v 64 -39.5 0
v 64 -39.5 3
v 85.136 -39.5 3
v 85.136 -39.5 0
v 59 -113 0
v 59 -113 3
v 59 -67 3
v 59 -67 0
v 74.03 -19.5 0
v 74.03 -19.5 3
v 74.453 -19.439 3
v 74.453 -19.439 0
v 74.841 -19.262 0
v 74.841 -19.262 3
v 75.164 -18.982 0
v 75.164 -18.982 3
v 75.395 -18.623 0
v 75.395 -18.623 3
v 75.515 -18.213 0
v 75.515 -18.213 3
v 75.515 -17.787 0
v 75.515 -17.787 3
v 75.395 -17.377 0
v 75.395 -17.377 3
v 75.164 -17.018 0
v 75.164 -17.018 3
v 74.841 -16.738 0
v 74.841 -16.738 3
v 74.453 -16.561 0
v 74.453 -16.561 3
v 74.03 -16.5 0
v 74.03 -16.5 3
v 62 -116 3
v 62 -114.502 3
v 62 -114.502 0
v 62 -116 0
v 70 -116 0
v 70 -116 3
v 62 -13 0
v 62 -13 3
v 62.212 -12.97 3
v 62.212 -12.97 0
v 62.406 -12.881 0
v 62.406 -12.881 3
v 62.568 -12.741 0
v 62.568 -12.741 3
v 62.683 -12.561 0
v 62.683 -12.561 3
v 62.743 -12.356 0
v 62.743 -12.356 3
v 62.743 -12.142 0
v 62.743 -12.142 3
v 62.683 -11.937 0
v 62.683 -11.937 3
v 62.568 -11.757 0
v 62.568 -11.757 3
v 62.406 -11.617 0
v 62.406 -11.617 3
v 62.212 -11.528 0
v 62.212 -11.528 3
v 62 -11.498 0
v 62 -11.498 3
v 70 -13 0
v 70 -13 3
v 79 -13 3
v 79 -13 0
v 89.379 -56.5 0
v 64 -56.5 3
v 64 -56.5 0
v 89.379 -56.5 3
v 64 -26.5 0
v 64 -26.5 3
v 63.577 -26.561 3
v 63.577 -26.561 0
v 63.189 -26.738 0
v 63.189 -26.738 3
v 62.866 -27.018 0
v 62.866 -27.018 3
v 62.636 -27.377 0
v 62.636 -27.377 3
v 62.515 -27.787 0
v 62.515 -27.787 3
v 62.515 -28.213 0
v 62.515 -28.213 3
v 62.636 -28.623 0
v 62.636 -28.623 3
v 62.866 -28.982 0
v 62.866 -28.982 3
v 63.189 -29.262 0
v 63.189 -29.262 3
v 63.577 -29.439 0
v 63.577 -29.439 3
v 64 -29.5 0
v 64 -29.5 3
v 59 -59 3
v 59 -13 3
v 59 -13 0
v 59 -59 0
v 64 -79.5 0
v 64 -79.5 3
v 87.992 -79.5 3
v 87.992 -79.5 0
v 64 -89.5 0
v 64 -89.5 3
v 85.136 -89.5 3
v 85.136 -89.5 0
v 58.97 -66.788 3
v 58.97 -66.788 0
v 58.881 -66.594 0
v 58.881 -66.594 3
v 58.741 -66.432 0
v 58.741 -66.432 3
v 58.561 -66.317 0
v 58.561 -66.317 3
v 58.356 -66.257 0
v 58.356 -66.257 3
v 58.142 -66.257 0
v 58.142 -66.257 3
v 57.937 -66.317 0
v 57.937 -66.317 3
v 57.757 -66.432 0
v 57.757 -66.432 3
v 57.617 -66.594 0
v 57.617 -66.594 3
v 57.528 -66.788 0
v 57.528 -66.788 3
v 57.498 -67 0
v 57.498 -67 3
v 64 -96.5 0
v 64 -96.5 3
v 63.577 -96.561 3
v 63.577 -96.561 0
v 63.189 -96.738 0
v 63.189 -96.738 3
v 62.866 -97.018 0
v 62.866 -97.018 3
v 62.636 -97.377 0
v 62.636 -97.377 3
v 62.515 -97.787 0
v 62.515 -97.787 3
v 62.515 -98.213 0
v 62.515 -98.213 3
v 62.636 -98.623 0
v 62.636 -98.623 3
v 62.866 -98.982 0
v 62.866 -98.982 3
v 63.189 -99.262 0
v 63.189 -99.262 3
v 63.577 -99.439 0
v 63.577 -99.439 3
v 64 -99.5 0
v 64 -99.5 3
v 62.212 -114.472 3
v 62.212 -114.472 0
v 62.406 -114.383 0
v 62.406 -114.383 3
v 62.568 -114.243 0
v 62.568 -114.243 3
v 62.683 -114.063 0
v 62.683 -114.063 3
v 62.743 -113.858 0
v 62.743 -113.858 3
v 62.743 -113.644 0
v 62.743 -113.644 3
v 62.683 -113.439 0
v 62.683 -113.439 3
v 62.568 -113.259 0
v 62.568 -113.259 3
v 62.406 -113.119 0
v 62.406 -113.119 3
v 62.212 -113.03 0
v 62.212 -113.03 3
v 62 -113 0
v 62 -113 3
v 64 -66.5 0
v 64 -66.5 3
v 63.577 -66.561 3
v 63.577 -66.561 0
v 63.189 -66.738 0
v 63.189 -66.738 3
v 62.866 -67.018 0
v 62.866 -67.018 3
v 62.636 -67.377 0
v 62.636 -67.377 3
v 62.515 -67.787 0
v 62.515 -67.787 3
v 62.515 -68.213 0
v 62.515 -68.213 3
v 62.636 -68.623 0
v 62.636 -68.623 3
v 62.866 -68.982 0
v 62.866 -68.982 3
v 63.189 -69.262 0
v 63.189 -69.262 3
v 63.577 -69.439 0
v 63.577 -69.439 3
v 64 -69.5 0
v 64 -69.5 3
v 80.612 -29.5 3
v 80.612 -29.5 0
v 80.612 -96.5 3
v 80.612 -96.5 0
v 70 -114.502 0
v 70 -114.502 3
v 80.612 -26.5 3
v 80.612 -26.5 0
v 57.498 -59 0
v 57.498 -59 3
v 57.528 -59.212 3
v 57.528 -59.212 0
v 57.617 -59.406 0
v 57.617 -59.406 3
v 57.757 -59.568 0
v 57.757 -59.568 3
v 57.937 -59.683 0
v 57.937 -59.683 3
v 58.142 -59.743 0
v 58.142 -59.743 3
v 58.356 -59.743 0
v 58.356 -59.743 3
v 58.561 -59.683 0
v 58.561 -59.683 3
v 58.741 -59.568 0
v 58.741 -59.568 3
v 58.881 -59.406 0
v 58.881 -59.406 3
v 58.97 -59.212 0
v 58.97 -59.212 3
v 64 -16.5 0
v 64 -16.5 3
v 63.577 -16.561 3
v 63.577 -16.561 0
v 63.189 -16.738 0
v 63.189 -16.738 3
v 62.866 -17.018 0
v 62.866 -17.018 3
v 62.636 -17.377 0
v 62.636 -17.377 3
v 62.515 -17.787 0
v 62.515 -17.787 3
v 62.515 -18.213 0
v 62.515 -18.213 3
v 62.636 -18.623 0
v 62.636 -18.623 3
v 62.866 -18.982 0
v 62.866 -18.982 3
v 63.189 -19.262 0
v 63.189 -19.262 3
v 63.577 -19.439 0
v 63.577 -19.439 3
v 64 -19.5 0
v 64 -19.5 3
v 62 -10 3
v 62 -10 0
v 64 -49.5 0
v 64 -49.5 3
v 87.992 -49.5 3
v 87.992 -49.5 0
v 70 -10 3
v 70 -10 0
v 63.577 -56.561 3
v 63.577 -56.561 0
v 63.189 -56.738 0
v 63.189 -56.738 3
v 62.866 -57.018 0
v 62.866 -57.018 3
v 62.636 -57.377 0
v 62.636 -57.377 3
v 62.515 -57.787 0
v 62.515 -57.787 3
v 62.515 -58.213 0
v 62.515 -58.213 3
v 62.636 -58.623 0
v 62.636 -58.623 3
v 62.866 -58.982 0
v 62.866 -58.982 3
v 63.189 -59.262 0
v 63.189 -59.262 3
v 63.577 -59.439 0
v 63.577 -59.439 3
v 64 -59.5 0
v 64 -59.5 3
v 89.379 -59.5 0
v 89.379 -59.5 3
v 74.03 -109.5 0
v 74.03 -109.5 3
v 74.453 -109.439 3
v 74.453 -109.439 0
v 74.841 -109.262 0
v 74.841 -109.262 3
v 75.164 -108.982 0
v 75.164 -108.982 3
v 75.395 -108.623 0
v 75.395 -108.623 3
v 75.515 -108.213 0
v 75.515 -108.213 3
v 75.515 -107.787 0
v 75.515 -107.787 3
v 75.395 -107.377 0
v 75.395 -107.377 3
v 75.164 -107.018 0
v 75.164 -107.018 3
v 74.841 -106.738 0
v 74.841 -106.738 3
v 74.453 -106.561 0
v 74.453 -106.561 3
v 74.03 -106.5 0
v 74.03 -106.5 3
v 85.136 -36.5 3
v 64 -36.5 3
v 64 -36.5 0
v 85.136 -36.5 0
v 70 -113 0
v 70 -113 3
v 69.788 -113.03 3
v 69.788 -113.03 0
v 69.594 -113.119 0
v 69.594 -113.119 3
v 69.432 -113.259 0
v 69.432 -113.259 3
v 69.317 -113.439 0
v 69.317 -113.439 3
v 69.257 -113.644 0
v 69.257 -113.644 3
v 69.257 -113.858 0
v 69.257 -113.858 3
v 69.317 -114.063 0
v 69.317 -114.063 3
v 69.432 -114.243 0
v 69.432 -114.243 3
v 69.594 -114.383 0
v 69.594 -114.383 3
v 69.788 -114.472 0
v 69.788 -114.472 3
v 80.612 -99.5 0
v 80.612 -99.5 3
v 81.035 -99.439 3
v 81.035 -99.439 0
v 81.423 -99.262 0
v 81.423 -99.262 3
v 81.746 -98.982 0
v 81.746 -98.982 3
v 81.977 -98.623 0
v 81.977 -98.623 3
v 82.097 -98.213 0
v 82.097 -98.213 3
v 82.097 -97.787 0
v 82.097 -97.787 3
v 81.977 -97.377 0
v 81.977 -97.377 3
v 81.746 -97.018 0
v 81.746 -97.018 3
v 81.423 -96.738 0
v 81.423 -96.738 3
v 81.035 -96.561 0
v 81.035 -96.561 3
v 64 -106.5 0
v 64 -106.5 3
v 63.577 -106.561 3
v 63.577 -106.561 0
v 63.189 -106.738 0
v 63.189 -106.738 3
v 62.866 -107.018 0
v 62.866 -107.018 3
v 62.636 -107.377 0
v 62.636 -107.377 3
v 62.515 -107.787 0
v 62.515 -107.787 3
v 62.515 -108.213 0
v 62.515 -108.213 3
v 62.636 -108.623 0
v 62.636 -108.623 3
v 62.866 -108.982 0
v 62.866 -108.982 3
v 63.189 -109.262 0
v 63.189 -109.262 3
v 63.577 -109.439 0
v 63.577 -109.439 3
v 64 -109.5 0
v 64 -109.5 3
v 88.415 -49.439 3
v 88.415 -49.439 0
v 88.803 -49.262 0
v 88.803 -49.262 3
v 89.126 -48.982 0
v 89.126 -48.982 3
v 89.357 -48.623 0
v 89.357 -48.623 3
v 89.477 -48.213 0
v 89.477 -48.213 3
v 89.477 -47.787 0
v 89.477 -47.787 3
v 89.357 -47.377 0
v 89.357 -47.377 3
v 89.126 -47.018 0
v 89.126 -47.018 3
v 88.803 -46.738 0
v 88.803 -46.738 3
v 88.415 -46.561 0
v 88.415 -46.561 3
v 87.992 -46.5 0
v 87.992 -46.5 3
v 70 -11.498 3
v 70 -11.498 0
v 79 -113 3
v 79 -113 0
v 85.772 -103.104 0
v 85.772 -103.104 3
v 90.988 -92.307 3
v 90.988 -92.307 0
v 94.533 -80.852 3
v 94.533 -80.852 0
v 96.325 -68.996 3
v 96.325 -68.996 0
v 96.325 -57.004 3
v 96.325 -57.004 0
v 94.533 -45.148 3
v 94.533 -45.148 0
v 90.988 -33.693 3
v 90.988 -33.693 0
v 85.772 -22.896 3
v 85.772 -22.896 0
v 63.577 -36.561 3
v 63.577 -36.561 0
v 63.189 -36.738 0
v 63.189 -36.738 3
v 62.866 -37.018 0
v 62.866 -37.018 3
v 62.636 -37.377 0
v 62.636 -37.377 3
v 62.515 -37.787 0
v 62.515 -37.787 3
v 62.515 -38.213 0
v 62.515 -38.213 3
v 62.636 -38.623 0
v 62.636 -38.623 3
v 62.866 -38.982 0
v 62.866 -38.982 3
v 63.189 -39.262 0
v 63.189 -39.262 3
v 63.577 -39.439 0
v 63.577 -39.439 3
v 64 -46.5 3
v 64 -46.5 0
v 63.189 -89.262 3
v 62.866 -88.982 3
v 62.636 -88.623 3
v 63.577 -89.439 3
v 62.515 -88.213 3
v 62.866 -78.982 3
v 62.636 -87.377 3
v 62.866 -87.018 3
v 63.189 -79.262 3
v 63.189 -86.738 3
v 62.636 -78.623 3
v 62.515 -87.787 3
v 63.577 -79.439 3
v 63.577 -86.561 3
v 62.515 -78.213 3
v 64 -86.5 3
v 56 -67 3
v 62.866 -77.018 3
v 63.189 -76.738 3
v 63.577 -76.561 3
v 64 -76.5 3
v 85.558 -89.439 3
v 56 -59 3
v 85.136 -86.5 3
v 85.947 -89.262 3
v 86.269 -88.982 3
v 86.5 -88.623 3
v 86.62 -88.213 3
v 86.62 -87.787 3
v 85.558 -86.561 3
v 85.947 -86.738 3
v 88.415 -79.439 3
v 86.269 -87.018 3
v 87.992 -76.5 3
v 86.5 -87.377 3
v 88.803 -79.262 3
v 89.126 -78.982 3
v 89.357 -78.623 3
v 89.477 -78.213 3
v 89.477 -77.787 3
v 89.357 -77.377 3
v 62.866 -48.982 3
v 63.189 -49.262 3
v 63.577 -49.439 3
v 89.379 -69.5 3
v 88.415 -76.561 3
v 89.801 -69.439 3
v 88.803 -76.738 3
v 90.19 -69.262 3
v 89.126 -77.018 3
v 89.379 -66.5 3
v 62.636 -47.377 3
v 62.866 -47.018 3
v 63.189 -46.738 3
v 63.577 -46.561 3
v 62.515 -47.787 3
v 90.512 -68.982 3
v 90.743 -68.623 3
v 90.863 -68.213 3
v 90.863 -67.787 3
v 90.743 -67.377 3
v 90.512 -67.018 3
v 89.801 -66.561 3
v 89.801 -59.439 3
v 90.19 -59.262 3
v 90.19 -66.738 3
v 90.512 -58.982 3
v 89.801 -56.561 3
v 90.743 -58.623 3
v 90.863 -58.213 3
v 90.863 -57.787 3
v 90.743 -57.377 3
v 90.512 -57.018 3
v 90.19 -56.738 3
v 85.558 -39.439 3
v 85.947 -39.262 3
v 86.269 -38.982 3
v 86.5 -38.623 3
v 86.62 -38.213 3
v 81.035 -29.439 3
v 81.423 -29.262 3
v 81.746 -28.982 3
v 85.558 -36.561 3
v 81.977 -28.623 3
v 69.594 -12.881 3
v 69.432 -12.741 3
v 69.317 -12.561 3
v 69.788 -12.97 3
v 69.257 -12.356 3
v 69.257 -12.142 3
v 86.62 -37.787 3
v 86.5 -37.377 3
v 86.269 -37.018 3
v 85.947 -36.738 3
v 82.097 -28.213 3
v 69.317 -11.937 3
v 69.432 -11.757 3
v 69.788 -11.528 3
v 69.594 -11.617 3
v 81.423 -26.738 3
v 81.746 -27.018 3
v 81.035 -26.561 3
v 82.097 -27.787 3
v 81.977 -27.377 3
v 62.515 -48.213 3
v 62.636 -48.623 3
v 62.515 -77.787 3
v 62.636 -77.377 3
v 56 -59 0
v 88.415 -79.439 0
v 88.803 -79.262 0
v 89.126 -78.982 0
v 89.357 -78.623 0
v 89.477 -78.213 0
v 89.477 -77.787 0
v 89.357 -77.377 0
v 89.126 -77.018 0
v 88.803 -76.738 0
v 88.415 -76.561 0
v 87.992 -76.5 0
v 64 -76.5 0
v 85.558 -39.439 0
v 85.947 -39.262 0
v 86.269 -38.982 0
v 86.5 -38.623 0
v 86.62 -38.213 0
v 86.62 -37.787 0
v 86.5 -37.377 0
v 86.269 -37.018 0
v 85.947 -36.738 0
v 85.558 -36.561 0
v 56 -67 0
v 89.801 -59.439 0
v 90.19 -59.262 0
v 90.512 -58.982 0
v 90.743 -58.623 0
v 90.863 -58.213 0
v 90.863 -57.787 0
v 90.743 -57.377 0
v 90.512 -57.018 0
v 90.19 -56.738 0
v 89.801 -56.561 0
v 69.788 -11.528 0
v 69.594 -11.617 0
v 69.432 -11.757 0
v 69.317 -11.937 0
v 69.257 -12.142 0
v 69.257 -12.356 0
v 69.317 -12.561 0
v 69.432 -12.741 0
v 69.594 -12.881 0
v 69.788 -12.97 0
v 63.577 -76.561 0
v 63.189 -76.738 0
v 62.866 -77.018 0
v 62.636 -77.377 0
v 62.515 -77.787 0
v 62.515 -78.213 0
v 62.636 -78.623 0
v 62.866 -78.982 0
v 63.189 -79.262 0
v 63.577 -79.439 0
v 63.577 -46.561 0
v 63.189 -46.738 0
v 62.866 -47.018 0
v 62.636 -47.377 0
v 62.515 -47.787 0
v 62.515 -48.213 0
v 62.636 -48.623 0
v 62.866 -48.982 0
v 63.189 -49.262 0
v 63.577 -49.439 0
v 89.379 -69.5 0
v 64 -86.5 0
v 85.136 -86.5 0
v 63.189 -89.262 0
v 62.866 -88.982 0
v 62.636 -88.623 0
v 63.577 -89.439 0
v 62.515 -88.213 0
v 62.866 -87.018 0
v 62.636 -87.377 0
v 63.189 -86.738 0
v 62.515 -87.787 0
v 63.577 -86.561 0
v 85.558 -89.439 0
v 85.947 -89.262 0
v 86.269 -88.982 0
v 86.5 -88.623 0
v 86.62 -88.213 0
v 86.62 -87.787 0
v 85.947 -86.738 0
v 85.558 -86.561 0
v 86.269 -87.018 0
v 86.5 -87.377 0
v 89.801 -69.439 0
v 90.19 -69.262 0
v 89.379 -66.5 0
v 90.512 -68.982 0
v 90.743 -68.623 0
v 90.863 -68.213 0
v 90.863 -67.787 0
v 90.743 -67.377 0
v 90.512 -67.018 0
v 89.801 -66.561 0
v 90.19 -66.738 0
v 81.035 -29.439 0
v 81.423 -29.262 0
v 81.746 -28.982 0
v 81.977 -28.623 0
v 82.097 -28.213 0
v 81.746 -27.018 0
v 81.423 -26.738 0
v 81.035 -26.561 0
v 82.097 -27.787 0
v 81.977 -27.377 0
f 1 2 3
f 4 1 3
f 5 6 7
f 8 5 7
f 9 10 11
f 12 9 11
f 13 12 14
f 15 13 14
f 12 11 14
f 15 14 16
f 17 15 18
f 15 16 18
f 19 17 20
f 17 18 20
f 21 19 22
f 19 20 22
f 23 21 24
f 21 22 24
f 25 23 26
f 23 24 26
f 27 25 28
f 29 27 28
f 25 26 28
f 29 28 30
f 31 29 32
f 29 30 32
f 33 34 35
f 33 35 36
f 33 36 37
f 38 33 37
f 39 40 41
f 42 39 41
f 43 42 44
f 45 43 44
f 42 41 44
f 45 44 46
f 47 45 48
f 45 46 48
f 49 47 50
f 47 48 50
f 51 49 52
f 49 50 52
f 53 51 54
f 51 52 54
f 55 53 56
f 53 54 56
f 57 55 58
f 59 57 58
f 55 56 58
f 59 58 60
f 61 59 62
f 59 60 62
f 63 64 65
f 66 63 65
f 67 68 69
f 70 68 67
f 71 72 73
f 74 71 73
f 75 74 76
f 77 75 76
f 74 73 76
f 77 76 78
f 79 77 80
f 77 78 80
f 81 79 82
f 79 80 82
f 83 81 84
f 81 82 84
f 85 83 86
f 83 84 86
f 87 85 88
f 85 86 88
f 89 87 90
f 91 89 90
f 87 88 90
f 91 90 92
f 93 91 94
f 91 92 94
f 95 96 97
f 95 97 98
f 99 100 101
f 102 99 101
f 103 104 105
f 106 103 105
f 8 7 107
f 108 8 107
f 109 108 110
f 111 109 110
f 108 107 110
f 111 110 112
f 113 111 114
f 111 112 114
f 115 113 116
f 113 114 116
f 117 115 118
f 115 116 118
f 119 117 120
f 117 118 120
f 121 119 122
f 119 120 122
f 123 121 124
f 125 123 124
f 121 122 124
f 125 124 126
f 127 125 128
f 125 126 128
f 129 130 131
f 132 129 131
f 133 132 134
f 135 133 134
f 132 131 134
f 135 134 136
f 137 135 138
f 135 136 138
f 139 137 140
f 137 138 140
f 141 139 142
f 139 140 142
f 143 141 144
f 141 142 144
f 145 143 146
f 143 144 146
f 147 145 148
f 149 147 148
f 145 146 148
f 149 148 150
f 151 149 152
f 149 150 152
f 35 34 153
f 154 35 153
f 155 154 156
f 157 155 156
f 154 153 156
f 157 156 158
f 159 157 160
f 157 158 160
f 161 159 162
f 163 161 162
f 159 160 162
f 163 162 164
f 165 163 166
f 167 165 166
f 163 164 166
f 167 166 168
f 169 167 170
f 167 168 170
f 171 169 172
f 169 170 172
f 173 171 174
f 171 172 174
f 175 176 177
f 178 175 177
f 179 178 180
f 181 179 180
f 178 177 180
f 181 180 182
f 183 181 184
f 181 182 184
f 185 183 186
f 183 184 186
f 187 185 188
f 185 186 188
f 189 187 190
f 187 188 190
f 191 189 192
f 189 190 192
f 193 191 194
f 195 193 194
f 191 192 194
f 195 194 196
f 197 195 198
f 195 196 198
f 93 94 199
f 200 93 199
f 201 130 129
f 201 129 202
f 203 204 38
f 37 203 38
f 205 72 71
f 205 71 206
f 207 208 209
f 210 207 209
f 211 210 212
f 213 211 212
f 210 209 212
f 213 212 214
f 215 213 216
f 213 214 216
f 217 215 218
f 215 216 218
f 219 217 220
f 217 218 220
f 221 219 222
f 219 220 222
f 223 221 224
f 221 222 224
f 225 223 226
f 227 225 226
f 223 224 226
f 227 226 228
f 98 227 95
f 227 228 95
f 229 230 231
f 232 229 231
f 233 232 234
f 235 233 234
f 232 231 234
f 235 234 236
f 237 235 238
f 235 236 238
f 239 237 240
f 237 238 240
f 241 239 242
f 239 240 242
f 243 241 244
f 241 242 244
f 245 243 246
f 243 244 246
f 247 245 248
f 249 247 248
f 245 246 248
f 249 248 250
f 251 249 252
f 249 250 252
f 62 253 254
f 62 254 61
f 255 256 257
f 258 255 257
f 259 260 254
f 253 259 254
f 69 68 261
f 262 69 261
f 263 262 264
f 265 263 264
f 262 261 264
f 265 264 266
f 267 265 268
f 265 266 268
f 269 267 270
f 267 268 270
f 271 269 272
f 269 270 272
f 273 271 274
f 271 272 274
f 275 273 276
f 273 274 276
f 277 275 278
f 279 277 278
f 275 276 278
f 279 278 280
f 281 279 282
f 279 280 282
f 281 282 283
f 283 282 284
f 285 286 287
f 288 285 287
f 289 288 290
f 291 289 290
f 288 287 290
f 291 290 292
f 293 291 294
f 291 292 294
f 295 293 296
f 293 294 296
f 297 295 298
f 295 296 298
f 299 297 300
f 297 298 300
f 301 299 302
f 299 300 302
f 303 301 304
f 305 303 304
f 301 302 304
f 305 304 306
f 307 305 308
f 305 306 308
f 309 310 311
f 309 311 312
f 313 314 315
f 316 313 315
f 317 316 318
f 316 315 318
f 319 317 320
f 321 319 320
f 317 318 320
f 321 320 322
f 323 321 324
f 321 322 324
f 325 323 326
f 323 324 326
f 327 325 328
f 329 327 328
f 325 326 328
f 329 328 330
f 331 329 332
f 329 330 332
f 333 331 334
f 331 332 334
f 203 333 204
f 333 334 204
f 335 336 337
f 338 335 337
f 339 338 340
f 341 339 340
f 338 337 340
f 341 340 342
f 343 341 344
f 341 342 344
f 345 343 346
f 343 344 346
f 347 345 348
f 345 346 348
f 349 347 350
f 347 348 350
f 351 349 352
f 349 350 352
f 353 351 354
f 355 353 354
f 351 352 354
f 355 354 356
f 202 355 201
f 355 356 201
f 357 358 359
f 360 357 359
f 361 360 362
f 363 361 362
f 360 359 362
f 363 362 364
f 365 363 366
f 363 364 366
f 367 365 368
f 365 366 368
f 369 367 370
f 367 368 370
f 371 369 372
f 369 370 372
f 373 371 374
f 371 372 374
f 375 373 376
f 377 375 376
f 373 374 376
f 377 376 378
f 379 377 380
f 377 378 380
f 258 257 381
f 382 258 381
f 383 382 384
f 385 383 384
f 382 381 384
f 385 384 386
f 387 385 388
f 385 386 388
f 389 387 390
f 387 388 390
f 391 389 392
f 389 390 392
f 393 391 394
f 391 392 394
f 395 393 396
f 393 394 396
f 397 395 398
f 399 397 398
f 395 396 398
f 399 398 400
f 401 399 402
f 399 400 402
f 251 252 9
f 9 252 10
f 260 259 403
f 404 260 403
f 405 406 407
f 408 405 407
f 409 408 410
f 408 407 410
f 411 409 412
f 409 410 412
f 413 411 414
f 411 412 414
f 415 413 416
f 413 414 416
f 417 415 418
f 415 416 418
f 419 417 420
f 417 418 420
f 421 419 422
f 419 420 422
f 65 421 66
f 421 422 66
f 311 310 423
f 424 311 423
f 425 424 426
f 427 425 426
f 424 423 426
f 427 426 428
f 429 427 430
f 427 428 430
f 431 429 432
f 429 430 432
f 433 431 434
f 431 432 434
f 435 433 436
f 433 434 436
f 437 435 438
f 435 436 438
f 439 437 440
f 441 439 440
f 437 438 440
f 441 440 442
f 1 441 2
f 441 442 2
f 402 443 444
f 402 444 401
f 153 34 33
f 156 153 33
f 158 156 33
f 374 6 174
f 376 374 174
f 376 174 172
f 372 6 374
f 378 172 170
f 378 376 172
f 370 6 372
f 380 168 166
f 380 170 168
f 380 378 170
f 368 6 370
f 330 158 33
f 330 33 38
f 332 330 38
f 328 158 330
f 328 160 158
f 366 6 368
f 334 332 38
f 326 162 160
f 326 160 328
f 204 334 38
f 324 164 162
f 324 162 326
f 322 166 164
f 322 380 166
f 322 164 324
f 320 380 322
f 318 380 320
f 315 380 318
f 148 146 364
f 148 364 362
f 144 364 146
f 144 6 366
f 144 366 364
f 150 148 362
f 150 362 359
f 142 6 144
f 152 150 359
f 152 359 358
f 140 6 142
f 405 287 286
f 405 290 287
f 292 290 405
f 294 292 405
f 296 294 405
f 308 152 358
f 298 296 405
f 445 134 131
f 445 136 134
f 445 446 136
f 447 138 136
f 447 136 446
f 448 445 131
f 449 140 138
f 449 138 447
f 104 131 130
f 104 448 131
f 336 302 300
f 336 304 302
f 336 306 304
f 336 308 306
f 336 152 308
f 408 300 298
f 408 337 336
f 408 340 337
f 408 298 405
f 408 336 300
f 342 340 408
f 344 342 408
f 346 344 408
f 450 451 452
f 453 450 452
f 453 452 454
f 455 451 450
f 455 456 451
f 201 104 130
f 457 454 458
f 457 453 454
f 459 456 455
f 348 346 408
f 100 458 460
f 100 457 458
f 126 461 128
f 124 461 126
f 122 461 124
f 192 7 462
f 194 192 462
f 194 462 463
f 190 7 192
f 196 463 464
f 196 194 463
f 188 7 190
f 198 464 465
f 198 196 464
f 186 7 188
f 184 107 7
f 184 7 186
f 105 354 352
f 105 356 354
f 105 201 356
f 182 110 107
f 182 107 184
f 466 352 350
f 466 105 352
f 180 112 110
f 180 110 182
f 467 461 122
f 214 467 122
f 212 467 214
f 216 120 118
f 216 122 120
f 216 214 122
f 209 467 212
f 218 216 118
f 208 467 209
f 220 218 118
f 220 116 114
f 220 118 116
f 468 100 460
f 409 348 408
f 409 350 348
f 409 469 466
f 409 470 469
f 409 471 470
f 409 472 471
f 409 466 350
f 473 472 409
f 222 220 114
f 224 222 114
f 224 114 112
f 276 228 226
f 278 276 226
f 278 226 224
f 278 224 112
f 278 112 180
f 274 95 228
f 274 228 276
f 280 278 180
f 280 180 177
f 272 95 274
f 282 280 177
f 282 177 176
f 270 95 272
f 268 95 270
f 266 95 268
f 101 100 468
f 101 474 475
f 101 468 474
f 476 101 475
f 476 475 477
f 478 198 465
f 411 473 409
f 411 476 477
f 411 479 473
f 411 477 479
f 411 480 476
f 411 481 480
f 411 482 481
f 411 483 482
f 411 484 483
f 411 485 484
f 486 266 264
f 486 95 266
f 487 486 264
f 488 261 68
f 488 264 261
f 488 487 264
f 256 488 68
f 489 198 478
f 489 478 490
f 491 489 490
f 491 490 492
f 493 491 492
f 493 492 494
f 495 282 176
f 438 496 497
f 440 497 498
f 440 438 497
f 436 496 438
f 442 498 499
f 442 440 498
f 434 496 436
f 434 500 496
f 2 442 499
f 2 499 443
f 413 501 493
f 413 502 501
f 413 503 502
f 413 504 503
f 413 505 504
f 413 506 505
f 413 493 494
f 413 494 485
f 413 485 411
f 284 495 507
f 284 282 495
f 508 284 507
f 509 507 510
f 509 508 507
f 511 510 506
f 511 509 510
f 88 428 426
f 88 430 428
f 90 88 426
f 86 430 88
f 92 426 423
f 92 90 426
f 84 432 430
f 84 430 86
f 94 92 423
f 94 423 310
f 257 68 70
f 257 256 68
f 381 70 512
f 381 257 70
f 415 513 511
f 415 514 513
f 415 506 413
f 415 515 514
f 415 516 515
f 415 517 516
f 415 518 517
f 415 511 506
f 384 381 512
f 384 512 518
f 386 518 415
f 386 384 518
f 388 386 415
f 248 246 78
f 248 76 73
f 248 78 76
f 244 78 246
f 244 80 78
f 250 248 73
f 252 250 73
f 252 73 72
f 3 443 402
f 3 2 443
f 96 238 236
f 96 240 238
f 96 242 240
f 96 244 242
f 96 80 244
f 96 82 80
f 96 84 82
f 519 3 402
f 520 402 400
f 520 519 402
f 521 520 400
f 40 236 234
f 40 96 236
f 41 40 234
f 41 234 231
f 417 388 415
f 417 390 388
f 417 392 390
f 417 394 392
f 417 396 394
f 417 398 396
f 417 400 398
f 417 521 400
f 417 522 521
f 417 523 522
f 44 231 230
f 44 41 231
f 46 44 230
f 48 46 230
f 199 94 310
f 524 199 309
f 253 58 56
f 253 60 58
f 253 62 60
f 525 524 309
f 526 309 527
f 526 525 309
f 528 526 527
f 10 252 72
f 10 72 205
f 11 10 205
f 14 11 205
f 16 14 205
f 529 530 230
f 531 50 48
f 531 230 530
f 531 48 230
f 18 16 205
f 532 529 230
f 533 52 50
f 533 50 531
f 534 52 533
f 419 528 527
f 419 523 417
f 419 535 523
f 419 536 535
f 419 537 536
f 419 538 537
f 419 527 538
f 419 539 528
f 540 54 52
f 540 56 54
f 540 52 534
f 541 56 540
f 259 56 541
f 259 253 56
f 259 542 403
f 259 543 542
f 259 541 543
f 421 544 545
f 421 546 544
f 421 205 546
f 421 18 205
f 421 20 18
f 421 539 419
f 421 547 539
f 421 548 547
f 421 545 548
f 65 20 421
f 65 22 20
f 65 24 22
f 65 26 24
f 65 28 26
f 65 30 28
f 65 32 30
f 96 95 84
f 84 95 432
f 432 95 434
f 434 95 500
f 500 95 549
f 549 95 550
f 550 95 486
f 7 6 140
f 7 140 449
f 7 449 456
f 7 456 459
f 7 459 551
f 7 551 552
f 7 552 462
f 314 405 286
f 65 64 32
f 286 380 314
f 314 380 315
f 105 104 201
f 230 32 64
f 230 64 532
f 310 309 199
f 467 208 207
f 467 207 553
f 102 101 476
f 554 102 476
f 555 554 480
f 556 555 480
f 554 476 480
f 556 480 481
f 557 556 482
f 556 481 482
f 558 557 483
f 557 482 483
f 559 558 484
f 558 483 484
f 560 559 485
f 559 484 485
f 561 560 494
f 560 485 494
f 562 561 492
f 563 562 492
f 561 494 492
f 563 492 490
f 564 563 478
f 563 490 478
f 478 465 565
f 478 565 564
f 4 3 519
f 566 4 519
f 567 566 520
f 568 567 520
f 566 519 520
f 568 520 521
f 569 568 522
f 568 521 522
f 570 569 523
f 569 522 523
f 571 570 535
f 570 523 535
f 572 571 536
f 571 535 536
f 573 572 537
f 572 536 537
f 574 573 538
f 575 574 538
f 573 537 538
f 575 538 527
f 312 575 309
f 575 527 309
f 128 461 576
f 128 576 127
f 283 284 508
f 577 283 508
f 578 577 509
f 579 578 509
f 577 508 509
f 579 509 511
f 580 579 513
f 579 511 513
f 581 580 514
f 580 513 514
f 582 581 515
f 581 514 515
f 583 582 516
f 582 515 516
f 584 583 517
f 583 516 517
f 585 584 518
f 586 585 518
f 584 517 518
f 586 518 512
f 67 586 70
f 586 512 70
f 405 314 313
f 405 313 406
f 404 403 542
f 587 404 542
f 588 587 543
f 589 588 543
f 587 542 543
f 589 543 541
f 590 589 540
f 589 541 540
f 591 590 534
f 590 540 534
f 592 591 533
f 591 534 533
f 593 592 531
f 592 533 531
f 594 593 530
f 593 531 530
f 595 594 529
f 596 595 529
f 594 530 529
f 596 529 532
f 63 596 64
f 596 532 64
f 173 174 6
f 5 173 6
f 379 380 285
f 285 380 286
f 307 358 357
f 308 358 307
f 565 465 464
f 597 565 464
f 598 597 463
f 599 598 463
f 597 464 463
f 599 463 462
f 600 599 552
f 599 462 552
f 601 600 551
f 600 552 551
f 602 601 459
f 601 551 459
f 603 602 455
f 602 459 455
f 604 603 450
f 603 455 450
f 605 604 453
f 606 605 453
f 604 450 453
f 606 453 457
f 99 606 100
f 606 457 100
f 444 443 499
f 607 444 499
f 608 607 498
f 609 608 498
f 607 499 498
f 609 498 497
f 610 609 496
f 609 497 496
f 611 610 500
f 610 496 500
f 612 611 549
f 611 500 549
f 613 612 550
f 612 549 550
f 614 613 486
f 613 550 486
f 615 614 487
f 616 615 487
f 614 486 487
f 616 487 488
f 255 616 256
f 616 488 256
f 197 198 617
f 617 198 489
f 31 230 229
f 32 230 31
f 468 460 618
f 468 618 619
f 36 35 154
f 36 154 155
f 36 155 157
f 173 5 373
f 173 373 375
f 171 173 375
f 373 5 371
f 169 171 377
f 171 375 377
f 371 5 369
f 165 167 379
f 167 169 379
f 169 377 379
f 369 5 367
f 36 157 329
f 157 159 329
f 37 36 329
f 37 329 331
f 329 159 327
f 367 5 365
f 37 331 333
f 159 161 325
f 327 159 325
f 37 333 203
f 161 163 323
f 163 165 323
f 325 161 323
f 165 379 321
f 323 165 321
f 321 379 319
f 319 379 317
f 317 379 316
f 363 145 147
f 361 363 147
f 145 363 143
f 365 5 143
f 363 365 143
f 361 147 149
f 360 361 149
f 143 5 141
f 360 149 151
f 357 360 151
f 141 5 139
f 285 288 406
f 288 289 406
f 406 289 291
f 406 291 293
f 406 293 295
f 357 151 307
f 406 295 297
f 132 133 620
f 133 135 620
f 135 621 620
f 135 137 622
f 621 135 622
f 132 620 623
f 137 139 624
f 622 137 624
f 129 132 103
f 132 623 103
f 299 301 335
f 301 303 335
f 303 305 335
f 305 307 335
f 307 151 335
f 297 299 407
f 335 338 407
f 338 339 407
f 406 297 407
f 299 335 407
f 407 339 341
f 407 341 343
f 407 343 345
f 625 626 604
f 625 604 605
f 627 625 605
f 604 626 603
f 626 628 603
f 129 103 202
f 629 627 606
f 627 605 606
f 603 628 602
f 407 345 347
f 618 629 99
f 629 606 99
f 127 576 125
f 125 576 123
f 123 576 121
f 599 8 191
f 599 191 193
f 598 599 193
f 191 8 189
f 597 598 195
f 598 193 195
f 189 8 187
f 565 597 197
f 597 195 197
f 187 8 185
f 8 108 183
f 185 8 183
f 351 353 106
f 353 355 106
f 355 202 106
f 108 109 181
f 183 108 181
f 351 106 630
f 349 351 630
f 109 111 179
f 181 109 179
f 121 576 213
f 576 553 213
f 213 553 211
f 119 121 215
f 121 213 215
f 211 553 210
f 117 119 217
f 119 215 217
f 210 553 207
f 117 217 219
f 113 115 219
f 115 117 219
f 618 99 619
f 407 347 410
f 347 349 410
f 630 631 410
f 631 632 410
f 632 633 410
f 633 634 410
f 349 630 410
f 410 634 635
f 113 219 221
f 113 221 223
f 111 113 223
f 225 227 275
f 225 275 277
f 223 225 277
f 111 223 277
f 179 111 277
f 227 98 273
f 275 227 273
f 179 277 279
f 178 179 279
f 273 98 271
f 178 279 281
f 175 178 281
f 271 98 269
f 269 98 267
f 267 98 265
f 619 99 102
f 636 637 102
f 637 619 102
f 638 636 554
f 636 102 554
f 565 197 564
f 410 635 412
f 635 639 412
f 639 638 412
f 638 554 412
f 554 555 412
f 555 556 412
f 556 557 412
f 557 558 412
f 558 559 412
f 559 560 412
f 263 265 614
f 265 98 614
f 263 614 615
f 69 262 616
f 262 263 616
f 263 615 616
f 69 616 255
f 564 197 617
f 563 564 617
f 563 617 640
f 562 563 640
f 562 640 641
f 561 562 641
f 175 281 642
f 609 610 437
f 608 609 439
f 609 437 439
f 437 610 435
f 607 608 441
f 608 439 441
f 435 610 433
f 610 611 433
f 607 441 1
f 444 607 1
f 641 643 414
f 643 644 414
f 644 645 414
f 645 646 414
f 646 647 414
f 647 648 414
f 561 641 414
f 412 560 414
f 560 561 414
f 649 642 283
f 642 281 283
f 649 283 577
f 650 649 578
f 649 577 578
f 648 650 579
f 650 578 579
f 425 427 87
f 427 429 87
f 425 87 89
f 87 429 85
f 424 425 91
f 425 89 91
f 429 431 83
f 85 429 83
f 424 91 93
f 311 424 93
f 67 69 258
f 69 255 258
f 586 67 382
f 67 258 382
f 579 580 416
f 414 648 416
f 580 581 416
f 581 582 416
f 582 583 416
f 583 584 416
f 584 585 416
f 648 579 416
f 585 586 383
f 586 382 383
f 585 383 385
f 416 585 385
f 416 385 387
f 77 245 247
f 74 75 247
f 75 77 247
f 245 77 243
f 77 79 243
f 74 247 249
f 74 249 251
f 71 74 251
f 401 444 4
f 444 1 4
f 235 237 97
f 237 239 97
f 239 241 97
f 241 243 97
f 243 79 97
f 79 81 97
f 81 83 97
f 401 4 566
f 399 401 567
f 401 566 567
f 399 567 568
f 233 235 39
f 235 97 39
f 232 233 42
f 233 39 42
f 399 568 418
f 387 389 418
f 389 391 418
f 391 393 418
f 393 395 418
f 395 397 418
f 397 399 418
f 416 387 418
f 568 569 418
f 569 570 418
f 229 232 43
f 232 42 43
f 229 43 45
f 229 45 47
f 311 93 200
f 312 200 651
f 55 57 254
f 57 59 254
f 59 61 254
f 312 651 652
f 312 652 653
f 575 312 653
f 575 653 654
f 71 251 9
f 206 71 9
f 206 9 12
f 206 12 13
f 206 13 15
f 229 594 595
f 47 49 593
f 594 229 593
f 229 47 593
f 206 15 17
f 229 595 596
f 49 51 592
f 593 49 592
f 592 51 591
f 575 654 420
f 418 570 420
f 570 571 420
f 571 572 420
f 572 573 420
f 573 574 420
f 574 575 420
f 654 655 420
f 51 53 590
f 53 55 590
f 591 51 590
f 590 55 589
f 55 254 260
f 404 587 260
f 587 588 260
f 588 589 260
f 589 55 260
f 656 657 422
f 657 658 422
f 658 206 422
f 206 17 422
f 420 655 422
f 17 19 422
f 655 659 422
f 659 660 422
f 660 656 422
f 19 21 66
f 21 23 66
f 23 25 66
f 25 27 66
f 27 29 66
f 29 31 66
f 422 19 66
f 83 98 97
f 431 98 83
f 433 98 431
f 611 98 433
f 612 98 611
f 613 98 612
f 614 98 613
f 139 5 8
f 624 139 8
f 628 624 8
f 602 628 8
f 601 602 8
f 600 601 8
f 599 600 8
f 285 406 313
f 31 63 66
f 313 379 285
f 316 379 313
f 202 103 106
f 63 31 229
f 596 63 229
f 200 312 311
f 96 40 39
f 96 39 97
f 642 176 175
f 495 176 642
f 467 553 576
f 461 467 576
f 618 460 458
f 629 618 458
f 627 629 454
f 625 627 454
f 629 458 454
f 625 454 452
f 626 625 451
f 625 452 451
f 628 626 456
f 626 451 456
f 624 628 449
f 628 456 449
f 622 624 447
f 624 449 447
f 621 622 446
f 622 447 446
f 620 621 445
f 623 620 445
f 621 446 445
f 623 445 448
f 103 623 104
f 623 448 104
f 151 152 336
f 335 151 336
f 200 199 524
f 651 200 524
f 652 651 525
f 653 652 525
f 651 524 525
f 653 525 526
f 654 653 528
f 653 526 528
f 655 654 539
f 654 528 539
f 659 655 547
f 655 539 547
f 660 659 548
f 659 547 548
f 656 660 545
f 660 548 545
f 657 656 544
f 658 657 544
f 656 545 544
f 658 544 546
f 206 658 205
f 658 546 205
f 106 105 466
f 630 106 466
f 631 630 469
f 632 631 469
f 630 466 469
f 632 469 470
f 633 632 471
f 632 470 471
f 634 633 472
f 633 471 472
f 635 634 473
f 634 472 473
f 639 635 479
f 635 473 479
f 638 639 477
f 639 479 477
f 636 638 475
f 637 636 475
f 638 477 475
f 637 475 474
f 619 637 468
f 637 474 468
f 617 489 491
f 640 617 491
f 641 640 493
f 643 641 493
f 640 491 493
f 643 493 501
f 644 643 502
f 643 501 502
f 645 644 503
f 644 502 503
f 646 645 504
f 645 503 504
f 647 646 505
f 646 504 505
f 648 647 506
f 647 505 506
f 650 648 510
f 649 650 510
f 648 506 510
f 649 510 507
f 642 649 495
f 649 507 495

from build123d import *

# Parameters (mm, degrees)
PAD002_DEPTH       = 3
POCKET004_DEPTH    = 3.001
POCKET003006_DEPTH = 3.001


with BuildPart() as part:
    # Sketch006 → Pad002 (new body)
    with BuildSketch(Plane.XY):
        with BuildLine():
            Line((79, -10), (56, -10))
            Line((56, -10), (56, -116))
            Line((56, -116), (79, -116))
            Line((79, -116), (79, -113))
            ThreePointArc((79, -113), (96.55002, -63), (79, -13))
            Line((79, -10), (79, -13))
        make_face()
    extrude(amount=PAD002_DEPTH)

    # Sketch007 → Pocket004 (cut, through all)
    with BuildSketch(Plane.XY.offset(3)):
        with BuildLine():
            Line((79, -10), (70, -10))
            Line((70, -10), (70, -11.498))
            ThreePointArc((70, -11.498), (69.249, -12.249), (70, -13))
            Line((70, -13), (79, -13))
            Line((79, -13), (79, -10))
        make_face()
        with BuildLine():
            Line((62, -13), (59, -13))
            Line((59, -13), (59, -59))
            ThreePointArc((57.498, -59), (58.249, -59.751), (59, -59))
            Line((57.498, -59), (56, -59))
            Line((56, -10), (56, -59))
            Line((62, -10), (56, -10))
            Line((62, -10), (62, -11.498))
            ThreePointArc((62, -13), (62.751, -12.249), (62, -11.498))
        make_face()
        with BuildLine():
            Line((79, -116), (70, -116))
            Line((70, -114.502), (70, -116))
            ThreePointArc((70, -113), (69.249, -113.751), (70, -114.502))
            Line((70, -113), (79, -113))
            Line((79, -113), (79, -116))
        make_face()
        with BuildLine():
            Line((62, -113), (59, -113))
            Line((59, -113), (59, -67))
            ThreePointArc((59, -67), (58.249, -66.249), (57.498, -67))
            Line((56, -67), (57.498, -67))
            Line((56, -67), (56, -116))
            Line((56, -116), (62, -116))
            Line((62, -114.502), (62, -116))
            ThreePointArc((62, -114.502), (62.751, -113.751), (62, -113))
        make_face()
    extrude(amount=-POCKET004_DEPTH, mode=Mode.SUBTRACT)

    # Sketch001006 → Pocket003006 (cut, through all)
    with BuildSketch(Plane.XY.offset(3)):
        with BuildLine():
            Line((64, -109.5), (74.030451, -109.5))
            ThreePointArc((74.030451, -109.5), (75.530451, -108), (74.030451, -106.5))
            Line((64, -106.5), (74.030451, -106.5))
            ThreePointArc((64, -106.5), (62.5, -108), (64, -109.5))
        make_face()
        with BuildLine():
            Line((64, -96.5), (80.61249, -96.5))
            ThreePointArc((80.61249, -99.5), (82.11249, -98), (80.61249, -96.5))
            Line((64, -99.5), (80.61249, -99.5))
            ThreePointArc((64, -96.5), (62.5, -98), (64, -99.5))
        make_face()
        with BuildLine():
            Line((64, -86.5), (85.135733, -86.5))
            ThreePointArc((85.135733, -89.5), (86.635733, -88), (85.135733, -86.5))
            Line((64, -89.5), (85.135733, -89.5))
            ThreePointArc((64, -86.5), (62.5, -88), (64, -89.5))
        make_face()
        with BuildLine():
            Line((64, -76.5), (87.992304, -76.5))
            ThreePointArc((87.992304, -79.5), (89.492304, -78), (87.992304, -76.5))
            Line((64, -79.5), (87.992304, -79.5))
            ThreePointArc((64, -76.5), (62.5, -78), (64, -79.5))
        make_face()
        with BuildLine():
            Line((64, -69.5), (89.378586, -69.5))
            ThreePointArc((89.378586, -69.5), (90.878586, -68), (89.378586, -66.5))
            Line((64, -66.5), (89.378586, -66.5))
            ThreePointArc((64, -66.5), (62.5, -68), (64, -69.5))
        make_face()
        with BuildLine():
            Line((64, -59.5), (89.378586, -59.5))
            ThreePointArc((89.378586, -59.5), (90.878586, -58), (89.378586, -56.5))
            Line((64, -56.5), (89.378586, -56.5))
            ThreePointArc((64, -56.5), (62.5, -58), (64, -59.5))
        make_face()
        with BuildLine():
            Line((64, -49.5), (87.992304, -49.5))
            ThreePointArc((87.992304, -49.5), (89.492304, -48), (87.992304, -46.5))
            Line((64, -46.5), (87.992304, -46.5))
            ThreePointArc((64, -46.5), (62.5, -48), (64, -49.5))
        make_face()
        with BuildLine():
            Line((64, -39.5), (85.135733, -39.5))
            ThreePointArc((85.135733, -39.5), (86.635733, -38), (85.135733, -36.5))
            Line((64, -36.5), (85.135733, -36.5))
            ThreePointArc((64, -36.5), (62.5, -38), (64, -39.5))
        make_face()
        with BuildLine():
            Line((64, -26.5), (80.61249, -26.5))
            ThreePointArc((80.61249, -29.5), (82.11249, -28), (80.61249, -26.5))
            Line((64, -29.5), (80.61249, -29.5))
            ThreePointArc((64, -26.5), (62.5, -28), (64, -29.5))
        make_face()
        with BuildLine():
            Line((64, -16.5), (74.030451, -16.5))
            ThreePointArc((74.030451, -19.5), (75.530451, -18), (74.030451, -16.5))
            Line((64, -19.5), (74.030451, -19.5))
            ThreePointArc((64, -16.5), (62.5, -18), (64, -19.5))
        make_face()
    extrude(amount=-POCKET003006_DEPTH, mode=Mode.SUBTRACT)


solid = part.part
